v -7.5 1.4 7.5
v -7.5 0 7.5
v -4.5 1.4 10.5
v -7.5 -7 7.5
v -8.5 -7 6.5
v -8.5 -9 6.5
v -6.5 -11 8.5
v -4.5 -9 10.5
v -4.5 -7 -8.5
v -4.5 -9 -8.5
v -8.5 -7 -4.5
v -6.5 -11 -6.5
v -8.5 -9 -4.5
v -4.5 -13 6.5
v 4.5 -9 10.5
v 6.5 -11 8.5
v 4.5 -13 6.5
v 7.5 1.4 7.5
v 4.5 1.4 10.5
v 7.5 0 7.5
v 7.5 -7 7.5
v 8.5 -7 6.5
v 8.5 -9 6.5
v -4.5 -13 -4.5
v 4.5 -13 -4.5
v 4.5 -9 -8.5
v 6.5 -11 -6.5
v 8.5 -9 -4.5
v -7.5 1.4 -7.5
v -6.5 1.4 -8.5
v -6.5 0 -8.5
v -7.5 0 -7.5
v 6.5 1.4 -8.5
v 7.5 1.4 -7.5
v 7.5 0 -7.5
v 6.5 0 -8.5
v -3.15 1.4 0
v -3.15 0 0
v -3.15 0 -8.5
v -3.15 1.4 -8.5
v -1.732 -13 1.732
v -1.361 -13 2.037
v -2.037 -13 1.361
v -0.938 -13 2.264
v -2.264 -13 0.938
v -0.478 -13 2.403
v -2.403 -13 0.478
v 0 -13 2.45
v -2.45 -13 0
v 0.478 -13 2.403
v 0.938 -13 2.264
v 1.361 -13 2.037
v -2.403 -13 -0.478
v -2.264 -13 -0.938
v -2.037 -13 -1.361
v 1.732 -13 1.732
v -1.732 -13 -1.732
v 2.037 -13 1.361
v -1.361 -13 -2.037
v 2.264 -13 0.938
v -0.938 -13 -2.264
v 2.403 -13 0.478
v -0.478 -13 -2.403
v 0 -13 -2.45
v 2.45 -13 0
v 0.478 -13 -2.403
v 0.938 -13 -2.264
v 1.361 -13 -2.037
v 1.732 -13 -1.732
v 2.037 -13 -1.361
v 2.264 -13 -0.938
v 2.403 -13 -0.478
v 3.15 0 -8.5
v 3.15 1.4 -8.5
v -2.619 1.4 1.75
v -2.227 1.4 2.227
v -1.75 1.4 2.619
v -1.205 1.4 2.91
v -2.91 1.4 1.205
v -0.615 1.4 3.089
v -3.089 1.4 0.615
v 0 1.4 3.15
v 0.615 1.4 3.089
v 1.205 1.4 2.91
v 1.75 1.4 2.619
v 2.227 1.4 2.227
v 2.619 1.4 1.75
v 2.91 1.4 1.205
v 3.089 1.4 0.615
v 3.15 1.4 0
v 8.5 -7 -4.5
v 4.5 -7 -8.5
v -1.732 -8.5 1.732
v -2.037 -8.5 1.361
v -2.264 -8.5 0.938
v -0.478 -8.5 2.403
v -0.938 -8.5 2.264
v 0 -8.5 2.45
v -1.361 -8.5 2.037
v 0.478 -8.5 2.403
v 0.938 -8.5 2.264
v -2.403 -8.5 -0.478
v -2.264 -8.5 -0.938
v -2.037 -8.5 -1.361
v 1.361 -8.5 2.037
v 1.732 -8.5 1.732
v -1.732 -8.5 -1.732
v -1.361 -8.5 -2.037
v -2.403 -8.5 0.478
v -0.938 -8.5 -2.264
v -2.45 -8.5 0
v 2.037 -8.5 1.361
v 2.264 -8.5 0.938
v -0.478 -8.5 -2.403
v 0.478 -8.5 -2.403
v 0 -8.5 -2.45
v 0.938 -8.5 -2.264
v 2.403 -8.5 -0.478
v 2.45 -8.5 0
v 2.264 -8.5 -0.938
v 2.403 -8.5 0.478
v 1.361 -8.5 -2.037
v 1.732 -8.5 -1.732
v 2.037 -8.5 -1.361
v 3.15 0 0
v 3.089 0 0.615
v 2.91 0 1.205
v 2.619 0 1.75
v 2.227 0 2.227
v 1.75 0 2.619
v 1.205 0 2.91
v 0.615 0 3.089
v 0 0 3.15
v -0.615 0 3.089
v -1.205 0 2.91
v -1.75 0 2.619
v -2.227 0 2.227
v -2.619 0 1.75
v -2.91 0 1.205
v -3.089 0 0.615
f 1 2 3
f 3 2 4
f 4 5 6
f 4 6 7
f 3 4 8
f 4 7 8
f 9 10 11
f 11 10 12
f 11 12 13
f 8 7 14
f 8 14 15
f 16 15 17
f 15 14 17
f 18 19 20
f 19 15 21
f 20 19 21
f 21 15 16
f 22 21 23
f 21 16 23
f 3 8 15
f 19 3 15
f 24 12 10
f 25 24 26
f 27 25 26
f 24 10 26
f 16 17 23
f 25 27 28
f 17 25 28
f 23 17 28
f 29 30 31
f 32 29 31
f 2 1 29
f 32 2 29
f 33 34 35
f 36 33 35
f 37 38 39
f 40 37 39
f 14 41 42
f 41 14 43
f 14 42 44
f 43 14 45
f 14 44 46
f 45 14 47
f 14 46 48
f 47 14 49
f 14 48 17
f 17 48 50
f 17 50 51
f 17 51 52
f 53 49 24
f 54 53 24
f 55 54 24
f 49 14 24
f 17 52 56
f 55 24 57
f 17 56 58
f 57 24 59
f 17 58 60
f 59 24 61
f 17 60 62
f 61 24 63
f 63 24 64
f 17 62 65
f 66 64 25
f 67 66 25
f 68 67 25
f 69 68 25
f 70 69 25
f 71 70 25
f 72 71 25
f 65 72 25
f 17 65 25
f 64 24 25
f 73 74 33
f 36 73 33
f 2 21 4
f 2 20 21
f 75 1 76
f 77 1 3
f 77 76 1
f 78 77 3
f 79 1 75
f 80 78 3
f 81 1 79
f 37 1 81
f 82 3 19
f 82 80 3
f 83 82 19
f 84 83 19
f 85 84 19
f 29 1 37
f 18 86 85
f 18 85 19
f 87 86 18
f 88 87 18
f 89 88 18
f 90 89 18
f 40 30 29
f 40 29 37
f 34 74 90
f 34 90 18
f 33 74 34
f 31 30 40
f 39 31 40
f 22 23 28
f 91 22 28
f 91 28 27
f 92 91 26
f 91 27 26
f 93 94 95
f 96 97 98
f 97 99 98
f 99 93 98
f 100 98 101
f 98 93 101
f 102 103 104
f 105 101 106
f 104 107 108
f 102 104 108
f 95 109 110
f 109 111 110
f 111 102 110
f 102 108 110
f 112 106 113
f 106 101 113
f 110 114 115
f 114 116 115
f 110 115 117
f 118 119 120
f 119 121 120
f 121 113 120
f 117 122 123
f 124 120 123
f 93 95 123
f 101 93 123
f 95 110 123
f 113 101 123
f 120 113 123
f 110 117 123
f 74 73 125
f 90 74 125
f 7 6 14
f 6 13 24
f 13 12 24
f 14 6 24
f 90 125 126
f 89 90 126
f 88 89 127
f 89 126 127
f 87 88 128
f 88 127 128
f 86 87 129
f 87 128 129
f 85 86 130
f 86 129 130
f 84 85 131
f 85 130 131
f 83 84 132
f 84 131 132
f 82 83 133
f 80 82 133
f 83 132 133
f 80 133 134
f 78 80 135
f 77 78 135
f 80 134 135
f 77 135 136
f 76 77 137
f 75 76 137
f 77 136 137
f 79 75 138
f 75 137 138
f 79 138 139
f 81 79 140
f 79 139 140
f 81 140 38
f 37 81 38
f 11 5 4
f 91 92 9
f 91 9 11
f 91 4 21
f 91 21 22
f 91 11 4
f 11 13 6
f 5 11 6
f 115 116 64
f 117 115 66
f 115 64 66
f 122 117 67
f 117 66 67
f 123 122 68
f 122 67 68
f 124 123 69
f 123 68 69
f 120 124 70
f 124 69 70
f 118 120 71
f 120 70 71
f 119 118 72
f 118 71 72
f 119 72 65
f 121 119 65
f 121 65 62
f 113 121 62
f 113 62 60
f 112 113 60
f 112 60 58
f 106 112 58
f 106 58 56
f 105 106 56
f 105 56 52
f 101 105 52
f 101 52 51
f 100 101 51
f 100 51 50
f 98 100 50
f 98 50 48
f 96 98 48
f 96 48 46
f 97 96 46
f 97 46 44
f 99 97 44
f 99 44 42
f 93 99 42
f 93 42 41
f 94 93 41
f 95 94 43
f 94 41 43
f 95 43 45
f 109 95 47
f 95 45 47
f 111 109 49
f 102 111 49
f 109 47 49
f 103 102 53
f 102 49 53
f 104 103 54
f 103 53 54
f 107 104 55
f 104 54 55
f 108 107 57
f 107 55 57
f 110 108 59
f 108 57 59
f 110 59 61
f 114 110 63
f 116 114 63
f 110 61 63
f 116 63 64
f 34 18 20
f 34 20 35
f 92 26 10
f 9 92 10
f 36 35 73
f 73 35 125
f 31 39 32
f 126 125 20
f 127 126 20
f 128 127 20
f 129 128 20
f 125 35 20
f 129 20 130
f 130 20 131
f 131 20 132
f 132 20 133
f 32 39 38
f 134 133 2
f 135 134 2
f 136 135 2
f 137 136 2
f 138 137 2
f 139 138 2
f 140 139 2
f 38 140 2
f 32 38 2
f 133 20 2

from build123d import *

# Parameters (mm, degrees)
BOSS_EXTRUDE1_DEPTH = 1.4
BOSS_EXTRUDE2_DEPTH = 15
SKETCH6_W           = 17
SKETCH6_H           = 17
BOSS_EXTRUDE3_DEPTH = 6
CUT_EXTRUDE4_START  = -16
SKETCH8_W           = 17
SKETCH8_H           = 7
CUT_EXTRUDE4_DEPTH  = 16
SKETCH9_W           = 17
SKETCH9_H           = 22.4
BOSS_EXTRUDE4_DEPTH = 2
SKETCH7_4_R         = 2.45
CUT_EXTRUDE3_DEPTH  = 4.5
CHAMFER1_SIZE       = 4
CHAMFER3_SIZE       = 4
CUT_EXTRUDE5_REACH  = 28.158
CHAMFER4_SIZE       = 1
SPLIT1_START        = 2.45
SPLIT1_DEPTH        = 4.05
SPLIT1_START_2      = -4.5
SPLIT1_2_DEPTH      = 2.0499999
SPLIT1_START_3      = -21
SPLIT1_3_DEPTH      = 6
SPLIT1_START_4      = -16.5
SPLIT1_4_OUTLINE_R  = 2.45
SPLIT1_4_DEPTH      = 1.5
SPLIT1_START_5      = -20.859650045
SPLIT1_5_OUTLINE_W  = 20
SPLIT1_5_OUTLINE_H  = 18
SPLIT1_5_DEPTH      = 2.828427125
SPLIT1_START_6      = -22.273863607
SPLIT1_6_OUTLINE_W  = 20
SPLIT1_6_OUTLINE_H  = 18
SPLIT1_6_DEPTH      = 2.828427124
SPLIT1_START_7      = -9
SPLIT1_7_DEPTH      = 20
SPLIT1_8_DEPTH      = 14


with BuildPart() as part:
    # Sketch3 → Boss-Extrude1 (new body)
    with BuildSketch(Plane(origin=(0, 0, 0), x_dir=(1, 0, 0), z_dir=(0, 1, 0))):
        with BuildLine():
            Line((-3.15, 0), (-3.15, 8.5))
            Line((-3.15, 8.5), (-8.5, 8.5))
            Line((-8.5, 8.5), (-8.5, -8.5))
            Line((-8.5, -8.5), (8.5, -8.5))
            Line((8.5, -8.5), (8.5, 8.5))
            Line((8.5, 8.5), (3.15, 8.5))
            Line((3.15, 8.5), (3.15, 0))
            ThreePointArc((3.15, 0), (0, -3.15), (-3.15, 0))
        make_face()
    extrude(amount=BOSS_EXTRUDE1_DEPTH)

    # Sketch4 → Boss-Extrude2 (add)
    with BuildSketch(Plane.XZ):
        with BuildLine():
            Line((7.5, 0), (7.5, -8.5))
            Line((7.5, -8.5), (8.5, -8.5))
            Line((8.5, -8.5), (8.5, 8.5))
            Line((8.5, 8.5), (-8.5, 8.5))
            Line((-8.5, 8.5), (-8.5, -8.5))
            Line((-8.5, -8.5), (-7.5, -8.5))
            Line((-7.5, -8.5), (-7.5, 0))
            ThreePointArc((-7.5, 0), (0, 7.5), (7.5, 0))
        make_face()
    extrude(amount=BOSS_EXTRUDE2_DEPTH)

    # Sketch6 → Boss-Extrude3 (add)
    with BuildSketch(Plane.XZ.offset(15)):
        Rectangle(SKETCH6_W, SKETCH6_H)
    extrude(amount=BOSS_EXTRUDE3_DEPTH)

    # Sketch8 → Cut-Extrude4 (cut)
    with BuildSketch(Plane(origin=(0, 0, -8.5), x_dir=(-1, 0, 0), z_dir=(0, 0, -1)).offset(CUT_EXTRUDE4_START)):
        with Locations((0, -3.5)):
            Rectangle(SKETCH8_W, SKETCH8_H)
    extrude(amount=CUT_EXTRUDE4_DEPTH, mode=Mode.SUBTRACT)

    # Sketch9 → Boss-Extrude4 (add)
    with BuildSketch(Plane.XY.offset(8.5)):
        with Locations((0, -9.8)):
            Rectangle(SKETCH9_W, SKETCH9_H)
    extrude(amount=BOSS_EXTRUDE4_DEPTH)

    # Sketch7<4> → Cut-Extrude3 (cut)
    with BuildSketch(Plane.XZ.offset(21)):
        with Locations(Location((0, 0, 0), (0, 0, 270))):
            Circle(SKETCH7_4_R)
    extrude(amount=-CUT_EXTRUDE3_DEPTH, mode=Mode.SUBTRACT)

    # Chamfer1
    chamfer1_edges = [part.edges().sort_by_distance(p)[0] for p in [
        (0, -21, 10.5),
        (-8.5, -21, 1),
        (0, -21, -8.5),
        (8.5, -21, 1),
    ]]
    chamfer(chamfer1_edges, length=CHAMFER1_SIZE)

    # Chamfer3
    # the kernel refuses this chamfer: 4 mm, written as the material it takes off along each edge
    with BuildSketch(Plane(origin=(8.5, -27.286731952, 10.5), x_dir=(-1, 0, 0), z_dir=(0, 1, 0))) as chamfer3_piece_1:
        Polygon((CHAMFER3_SIZE, 0), (0, -CHAMFER3_SIZE), (0, 0), align=None)
    extrude(amount=38.973463904, mode=Mode.SUBTRACT)
    with BuildSketch(Plane(origin=(8.5, -7, -8.5), x_dir=(-1, 0, 0), z_dir=(0, -1, 0))) as chamfer3_piece_2:
        Polygon((CHAMFER3_SIZE, 0), (0, -CHAMFER3_SIZE), (0, 0), align=None)
    extrude(amount=20.286731952, mode=Mode.SUBTRACT)
    with BuildSketch(Plane(origin=(-8.5, -27.286731952, -8.5), x_dir=(0, 0, 1), z_dir=(0, 1, 0))) as chamfer3_piece_3_section:
        Polygon((CHAMFER3_SIZE, 0), (0, CHAMFER3_SIZE), (0, 0), align=None)
    chamfer3_piece_3 = extrude(amount=30.573463904, mode=Mode.PRIVATE)
    chamfer3_piece_3 = split(chamfer3_piece_3, bisect_by=Plane(origin=(-8.5, 0, -8.5), z_dir=(0, -1, 0)), keep=Keep.TOP, mode=Mode.PRIVATE)
    add(chamfer3_piece_3, mode=Mode.SUBTRACT)
    with BuildSketch(Plane(origin=(-8.5, 11.686731952, 10.5), x_dir=(0, 0, -1), z_dir=(0, -1, 0))) as chamfer3_piece_4:
        Polygon((CHAMFER3_SIZE, 0), (0, CHAMFER3_SIZE), (0, 0), align=None)
    extrude(amount=38.973463904, mode=Mode.SUBTRACT)

    # Sketch10 → Cut-Extrude5 (cut, up to next)
    with BuildSketch(Plane(origin=(0, 1.4, 0), x_dir=(1, 0, 0), z_dir=(0, 1, 0)), mode=Mode.PRIVATE) as cut_extrude5_sk1:
        Polygon((7.5, -7.5), (7.5, 8.5), (8.5, 8.5), (8.5, -6.5), align=None)
    cut_extrude5_tool1 = extrude(cut_extrude5_sk1.sketch, amount=-CUT_EXTRUDE5_REACH, mode=Mode.PRIVATE) & part.part
    # Sketch10 → Cut-Extrude5 (cut, up to next)
    with BuildSketch(Plane(origin=(0, 1.4, 0), x_dir=(1, 0, 0), z_dir=(0, 1, 0)), mode=Mode.PRIVATE) as cut_extrude5_sk2:
        Polygon((-7.5, -7.5), (-7.5, 8.5), (-8.5, 8.5), (-8.5, -6.5), align=None)
    cut_extrude5_tool2 = extrude(cut_extrude5_sk2.sketch, amount=-CUT_EXTRUDE5_REACH, mode=Mode.PRIVATE) & part.part
    add(cut_extrude5_tool1.solids().sort_by_distance((7.994624, 1.4, -0.747312))[0], mode=Mode.SUBTRACT)
    add(cut_extrude5_tool2.solids().sort_by_distance((-7.994624, 1.4, -0.747312))[0], mode=Mode.SUBTRACT)

    # Chamfer4
    chamfer4_edges = [part.edges().sort_by_distance(p)[0] for p in [
        (7.5, 0.7, -8.5),
        (-7.5, 0.7, -8.5),
    ]]
    chamfer(chamfer4_edges, length=CHAMFER4_SIZE)

    # Split1 8 outline → Split1 8 (cut)
    with BuildSketch(Plane(origin=(0, 0, 0), x_dir=(1, 0, 0), z_dir=(0, 1, 0)).offset(SPLIT1_START_3)):
        Polygon((-8.5, 4.5), (-8.5, -6.5), (-4.5, -10.5), (4.5, -10.5), (8.5, -6.5), (8.5, 4.5), (4.5, 8.5), (-4.5, 8.5), align=None)
    extrude(amount=SPLIT1_8_DEPTH, mode=Mode.SUBTRACT)


with BuildPart() as body_2:
    # Split1: read off the stored shape, not the designer's step
    # Split1 outline → Split1 (new body)
    with BuildSketch(Plane.XY.offset(SPLIT1_START)):
        Polygon((8.5, -17), (8.5, -15), (-8.5, -15), (-8.5, -17), (-4.5, -21), (4.5, -21), align=None)
    extrude(amount=SPLIT1_DEPTH)

    # Split1 2 outline → Split1 2 (add)
    with BuildSketch(Plane.XY.offset(SPLIT1_START_2)):
        Polygon((8.5, -17), (8.5, -15), (-8.5, -15), (-8.5, -17), (-4.5, -21), (4.5, -21), align=None)
    extrude(amount=SPLIT1_2_DEPTH)

    # Split1 3 outline → Split1 3 (add)
    with BuildSketch(Plane(origin=(0, 0, 0), x_dir=(1, 0, 0), z_dir=(0, 1, 0)).offset(SPLIT1_START_3)):
        with BuildLine():
            ThreePointArc((0, 2.45), (2.45, 0), (0, -2.45))
            Line((0, -2.45), (8.5, -2.45))
            Line((8.5, -2.45), (8.5, 2.4500001))
            Line((8.5, 2.4500001), (0, 2.45))
        make_face()
        with BuildLine():
            ThreePointArc((0, -2.45), (-2.45, 0), (0, 2.45))
            Line((0, 2.45), (-8.5, 2.4500001))
            Line((-8.5, 2.4500001), (-8.5, -2.45))
            Line((-8.5, -2.45), (0, -2.45))
        make_face()
        Polygon((-4.5, 8.5), (-8.5, 4.5), (8.5, 4.5), (4.5, 8.5), align=None)
        Polygon((8.5, -6.5), (-8.5, -6.5), (-4.5, -10.5), (4.5, -10.5), align=None)
    extrude(amount=SPLIT1_3_DEPTH)

    # Split1 4 outline → Split1 4 (add)
    with BuildSketch(Plane(origin=(0, 0, 0), x_dir=(1, 0, 0), z_dir=(0, 1, 0)).offset(SPLIT1_START_4)):
        Circle(SPLIT1_4_OUTLINE_R)
    extrude(amount=SPLIT1_4_DEPTH)

    # Split1 5 outline → Split1 5 (cut)
    with BuildSketch(Plane(origin=(0, 0, 0), x_dir=(1, 0, 0), z_dir=(0, 0.707106781186546, 0.707106781186549)).offset(SPLIT1_START_5)):
        with Locations((0, -14)):
            Rectangle(SPLIT1_5_OUTLINE_W, SPLIT1_5_OUTLINE_H)
    extrude(amount=SPLIT1_5_DEPTH, mode=Mode.SUBTRACT)

    # Split1 6 outline → Split1 6 (cut)
    with BuildSketch(Plane(origin=(0, 0, 0), x_dir=(1, 0, 0), z_dir=(0, 0.707106781186546, -0.707106781186549)).offset(SPLIT1_START_6)):
        with Locations((0, 12)):
            Rectangle(SPLIT1_6_OUTLINE_W, SPLIT1_6_OUTLINE_H)
    extrude(amount=SPLIT1_6_DEPTH, mode=Mode.SUBTRACT)

    # Split1 7 outline → Split1 7 (cut)
    with BuildSketch(Plane.XY.offset(SPLIT1_START_7)):
        Polygon((-8.5, -21), (-4.5, -21), (-8.5, -17), align=None)
        Polygon((8.5, -21), (8.5, -17), (4.5, -21), align=None)
    extrude(amount=SPLIT1_7_DEPTH, mode=Mode.SUBTRACT)


with BuildPart() as body_2_1:
    # Body-Move/Copy2: read off the stored shape, not the designer's step
    # Body-Move/Copy2: moved
    add(body_2.part.moved(Location((0, 8, 0))))


with BuildPart() as part_1:
    add(part.part)

    # Combine2: union body 2
    add(body_2_1.part)


solid = part_1.part
